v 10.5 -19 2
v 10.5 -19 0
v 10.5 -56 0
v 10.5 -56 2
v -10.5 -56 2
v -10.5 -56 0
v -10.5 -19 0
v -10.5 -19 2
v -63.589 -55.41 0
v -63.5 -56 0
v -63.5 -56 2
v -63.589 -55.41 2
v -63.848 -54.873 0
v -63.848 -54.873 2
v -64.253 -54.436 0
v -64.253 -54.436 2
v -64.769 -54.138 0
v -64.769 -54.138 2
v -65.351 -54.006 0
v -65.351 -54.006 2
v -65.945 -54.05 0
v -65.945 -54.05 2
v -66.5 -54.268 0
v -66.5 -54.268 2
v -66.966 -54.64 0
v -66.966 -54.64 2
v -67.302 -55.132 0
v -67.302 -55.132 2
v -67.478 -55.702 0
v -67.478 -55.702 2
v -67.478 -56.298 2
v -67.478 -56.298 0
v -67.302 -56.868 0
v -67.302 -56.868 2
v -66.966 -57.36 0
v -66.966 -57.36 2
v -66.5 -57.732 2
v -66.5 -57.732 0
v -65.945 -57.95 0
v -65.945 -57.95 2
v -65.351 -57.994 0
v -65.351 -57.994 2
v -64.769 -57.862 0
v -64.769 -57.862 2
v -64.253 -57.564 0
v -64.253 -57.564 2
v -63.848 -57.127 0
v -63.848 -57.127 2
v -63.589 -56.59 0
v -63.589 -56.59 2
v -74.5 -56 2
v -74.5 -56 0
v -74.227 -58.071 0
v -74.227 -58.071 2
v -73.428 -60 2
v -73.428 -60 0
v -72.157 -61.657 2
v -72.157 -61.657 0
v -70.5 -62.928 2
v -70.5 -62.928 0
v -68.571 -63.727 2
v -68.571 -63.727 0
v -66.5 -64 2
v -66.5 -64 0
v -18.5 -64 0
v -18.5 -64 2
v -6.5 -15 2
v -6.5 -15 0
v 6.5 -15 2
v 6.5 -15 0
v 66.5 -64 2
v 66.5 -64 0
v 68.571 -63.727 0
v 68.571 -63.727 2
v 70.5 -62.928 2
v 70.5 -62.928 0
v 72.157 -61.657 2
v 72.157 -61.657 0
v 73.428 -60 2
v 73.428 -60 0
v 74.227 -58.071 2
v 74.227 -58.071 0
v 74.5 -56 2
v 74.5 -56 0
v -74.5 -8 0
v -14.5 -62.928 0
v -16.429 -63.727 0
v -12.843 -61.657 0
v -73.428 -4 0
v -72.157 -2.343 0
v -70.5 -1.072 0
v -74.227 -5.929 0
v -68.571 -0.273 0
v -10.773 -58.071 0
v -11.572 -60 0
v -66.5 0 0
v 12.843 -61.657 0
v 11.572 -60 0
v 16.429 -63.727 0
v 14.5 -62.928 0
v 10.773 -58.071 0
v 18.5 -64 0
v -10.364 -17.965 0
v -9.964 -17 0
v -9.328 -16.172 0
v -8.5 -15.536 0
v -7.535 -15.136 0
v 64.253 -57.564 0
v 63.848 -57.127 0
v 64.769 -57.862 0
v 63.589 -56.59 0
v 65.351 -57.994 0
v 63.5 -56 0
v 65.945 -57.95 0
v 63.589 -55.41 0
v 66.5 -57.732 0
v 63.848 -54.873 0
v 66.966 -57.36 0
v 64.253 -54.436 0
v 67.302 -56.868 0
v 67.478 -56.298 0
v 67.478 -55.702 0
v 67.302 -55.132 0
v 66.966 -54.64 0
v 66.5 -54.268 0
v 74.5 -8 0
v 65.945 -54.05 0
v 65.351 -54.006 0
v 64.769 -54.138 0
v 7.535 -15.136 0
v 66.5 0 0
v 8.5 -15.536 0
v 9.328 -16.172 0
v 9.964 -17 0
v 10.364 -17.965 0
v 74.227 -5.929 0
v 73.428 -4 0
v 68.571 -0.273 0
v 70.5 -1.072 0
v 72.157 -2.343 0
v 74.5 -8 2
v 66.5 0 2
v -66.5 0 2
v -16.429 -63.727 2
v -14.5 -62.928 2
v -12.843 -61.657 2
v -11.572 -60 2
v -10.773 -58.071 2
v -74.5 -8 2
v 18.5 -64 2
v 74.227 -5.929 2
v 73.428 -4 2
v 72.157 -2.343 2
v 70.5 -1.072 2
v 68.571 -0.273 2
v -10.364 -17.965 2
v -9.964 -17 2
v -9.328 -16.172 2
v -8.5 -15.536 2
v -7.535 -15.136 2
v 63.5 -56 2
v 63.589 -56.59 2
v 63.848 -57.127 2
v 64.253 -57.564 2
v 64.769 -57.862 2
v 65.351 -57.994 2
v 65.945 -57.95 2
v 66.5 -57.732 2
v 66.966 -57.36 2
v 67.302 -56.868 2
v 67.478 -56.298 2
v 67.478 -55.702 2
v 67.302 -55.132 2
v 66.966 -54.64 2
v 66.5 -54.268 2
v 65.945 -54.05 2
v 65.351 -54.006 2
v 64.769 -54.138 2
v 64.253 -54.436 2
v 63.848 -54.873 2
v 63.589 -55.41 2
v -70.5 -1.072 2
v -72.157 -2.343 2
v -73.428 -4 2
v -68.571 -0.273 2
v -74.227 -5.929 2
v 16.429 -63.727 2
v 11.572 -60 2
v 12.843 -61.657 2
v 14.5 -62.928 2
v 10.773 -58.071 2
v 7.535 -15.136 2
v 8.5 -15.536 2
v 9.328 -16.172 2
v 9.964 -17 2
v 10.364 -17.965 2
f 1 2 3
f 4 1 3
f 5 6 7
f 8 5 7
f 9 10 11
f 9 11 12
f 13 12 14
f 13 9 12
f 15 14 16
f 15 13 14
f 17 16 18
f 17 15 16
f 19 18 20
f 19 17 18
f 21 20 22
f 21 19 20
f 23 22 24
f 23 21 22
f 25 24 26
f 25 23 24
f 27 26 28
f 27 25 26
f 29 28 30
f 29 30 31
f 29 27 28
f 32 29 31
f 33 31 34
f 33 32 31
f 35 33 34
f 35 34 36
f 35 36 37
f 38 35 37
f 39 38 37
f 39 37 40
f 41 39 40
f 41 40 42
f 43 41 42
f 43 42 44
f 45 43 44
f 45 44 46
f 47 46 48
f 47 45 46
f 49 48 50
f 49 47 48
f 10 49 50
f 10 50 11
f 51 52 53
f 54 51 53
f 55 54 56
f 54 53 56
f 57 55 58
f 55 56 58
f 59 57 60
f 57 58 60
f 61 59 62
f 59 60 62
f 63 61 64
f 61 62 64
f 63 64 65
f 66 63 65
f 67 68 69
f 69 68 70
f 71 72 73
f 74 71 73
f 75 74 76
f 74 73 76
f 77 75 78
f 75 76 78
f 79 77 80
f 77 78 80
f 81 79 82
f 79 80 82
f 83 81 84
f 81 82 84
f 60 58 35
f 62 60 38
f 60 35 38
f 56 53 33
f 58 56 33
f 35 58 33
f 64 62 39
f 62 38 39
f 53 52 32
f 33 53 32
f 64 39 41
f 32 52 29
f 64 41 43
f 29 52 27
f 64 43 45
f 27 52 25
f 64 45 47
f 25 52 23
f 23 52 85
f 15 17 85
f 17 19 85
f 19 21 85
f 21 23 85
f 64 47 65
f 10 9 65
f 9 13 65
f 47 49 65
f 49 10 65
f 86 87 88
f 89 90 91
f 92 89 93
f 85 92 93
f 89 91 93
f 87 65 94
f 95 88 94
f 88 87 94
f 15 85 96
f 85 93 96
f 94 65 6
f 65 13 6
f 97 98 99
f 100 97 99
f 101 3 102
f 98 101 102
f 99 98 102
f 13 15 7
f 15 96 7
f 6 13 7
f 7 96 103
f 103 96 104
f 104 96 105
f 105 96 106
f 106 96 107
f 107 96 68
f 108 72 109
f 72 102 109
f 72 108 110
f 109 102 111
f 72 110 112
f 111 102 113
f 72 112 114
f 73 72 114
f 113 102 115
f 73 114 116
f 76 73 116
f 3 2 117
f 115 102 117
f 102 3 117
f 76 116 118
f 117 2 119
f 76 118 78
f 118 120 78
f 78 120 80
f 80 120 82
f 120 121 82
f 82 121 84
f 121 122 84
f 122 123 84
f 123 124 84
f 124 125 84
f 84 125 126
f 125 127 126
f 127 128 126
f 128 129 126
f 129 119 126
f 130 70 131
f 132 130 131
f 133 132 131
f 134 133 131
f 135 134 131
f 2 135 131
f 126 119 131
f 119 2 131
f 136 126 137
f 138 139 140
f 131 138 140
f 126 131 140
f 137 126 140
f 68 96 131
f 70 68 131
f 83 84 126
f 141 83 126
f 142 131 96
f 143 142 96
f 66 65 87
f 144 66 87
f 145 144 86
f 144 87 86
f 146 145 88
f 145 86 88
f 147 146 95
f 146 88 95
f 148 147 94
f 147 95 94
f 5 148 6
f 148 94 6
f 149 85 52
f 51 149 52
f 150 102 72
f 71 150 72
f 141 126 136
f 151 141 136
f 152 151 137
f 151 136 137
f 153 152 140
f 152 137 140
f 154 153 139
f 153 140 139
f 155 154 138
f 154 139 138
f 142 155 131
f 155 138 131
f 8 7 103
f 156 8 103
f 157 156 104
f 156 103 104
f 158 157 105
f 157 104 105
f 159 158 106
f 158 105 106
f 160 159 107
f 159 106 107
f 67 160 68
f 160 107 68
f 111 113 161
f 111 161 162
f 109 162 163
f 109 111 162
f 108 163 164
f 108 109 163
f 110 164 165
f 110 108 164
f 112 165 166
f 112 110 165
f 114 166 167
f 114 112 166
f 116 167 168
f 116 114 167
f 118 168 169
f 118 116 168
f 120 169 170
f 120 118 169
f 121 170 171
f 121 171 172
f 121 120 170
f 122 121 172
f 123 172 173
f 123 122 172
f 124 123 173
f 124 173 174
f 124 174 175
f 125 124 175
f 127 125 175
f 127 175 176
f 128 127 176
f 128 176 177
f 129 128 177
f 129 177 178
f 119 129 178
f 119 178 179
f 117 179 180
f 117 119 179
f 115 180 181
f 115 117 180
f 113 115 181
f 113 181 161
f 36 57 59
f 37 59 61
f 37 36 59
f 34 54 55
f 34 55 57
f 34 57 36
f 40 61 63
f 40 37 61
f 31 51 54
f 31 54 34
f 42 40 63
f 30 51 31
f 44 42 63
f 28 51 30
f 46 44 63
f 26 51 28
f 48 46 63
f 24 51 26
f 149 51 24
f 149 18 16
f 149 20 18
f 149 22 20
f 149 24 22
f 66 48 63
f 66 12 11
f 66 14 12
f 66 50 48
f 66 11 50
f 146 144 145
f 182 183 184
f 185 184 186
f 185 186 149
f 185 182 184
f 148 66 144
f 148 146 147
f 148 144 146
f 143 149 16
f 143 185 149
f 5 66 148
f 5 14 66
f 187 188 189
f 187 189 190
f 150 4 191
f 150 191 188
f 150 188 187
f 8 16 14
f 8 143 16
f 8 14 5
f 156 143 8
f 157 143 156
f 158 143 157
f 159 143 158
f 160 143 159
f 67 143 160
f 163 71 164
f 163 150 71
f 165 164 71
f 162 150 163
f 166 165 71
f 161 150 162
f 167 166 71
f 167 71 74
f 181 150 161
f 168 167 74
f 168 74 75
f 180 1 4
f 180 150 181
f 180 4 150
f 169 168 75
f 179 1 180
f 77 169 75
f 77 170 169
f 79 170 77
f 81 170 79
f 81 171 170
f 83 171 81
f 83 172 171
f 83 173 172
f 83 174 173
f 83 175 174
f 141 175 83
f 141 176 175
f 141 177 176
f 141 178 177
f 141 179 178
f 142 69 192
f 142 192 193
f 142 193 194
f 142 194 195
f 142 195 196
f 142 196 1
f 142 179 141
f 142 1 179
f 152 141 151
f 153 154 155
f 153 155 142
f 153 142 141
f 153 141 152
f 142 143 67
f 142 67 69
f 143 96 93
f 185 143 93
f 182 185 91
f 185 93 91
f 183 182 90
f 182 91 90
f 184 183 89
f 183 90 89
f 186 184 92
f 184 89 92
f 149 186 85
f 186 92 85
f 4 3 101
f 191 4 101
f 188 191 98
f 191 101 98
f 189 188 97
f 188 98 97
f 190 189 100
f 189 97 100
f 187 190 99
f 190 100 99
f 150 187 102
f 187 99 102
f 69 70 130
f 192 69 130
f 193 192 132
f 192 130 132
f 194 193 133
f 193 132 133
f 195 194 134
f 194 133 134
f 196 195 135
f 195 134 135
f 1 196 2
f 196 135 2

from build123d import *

# Parameters (mm, degrees)
SKETCH1_R           = 2
BOSS_EXTRUDE1_DEPTH = 2


with BuildPart() as part:
    # Sketch1 → Boss-Extrude1 (new body)
    with BuildSketch(Plane.XY):
        with BuildLine():
            Line((0, 0), (-66.5, 0))
            ThreePointArc((-66.5, 0), (-72.156854249, -2.343145751), (-74.5, -8))
            Line((-74.5, -8), (-74.5, -56))
            ThreePointArc((-74.5, -56), (-72.156854249, -61.656854249), (-66.5, -64))
            Line((-66.5, -64), (-18.5, -64))
            ThreePointArc((-18.5, -64), (-12.843145751, -61.656854249), (-10.5, -56))
            Line((-10.5, -56), (-10.5, -19))
            ThreePointArc((-10.5, -19), (-9.328427125, -16.171572875), (-6.5, -15))
            Line((-6.5, -15), (0, -15))
            Line((0, -15), (6.5, -15))
            ThreePointArc((6.5, -15), (9.328427125, -16.171572875), (10.5, -19))
            Line((10.5, -19), (10.5, -56))
            ThreePointArc((10.5, -56), (12.843145751, -61.656854249), (18.5, -64))
            Line((18.5, -64), (66.5, -64))
            ThreePointArc((66.5, -64), (72.156854249, -61.656854249), (74.5, -56))
            Line((74.5, -56), (74.5, -8))
            ThreePointArc((74.5, -8), (72.156854249, -2.343145751), (66.5, 0))
            Line((66.5, 0), (0, 0))
        make_face()
        with Locations((-65.5, -56)):
            Circle(SKETCH1_R, mode=Mode.SUBTRACT)
        with Locations(Location((65.5, -56, 0), (0, 0, 180))):
            Circle(SKETCH1_R, mode=Mode.SUBTRACT)
    extrude(amount=BOSS_EXTRUDE1_DEPTH)


solid = part.part
